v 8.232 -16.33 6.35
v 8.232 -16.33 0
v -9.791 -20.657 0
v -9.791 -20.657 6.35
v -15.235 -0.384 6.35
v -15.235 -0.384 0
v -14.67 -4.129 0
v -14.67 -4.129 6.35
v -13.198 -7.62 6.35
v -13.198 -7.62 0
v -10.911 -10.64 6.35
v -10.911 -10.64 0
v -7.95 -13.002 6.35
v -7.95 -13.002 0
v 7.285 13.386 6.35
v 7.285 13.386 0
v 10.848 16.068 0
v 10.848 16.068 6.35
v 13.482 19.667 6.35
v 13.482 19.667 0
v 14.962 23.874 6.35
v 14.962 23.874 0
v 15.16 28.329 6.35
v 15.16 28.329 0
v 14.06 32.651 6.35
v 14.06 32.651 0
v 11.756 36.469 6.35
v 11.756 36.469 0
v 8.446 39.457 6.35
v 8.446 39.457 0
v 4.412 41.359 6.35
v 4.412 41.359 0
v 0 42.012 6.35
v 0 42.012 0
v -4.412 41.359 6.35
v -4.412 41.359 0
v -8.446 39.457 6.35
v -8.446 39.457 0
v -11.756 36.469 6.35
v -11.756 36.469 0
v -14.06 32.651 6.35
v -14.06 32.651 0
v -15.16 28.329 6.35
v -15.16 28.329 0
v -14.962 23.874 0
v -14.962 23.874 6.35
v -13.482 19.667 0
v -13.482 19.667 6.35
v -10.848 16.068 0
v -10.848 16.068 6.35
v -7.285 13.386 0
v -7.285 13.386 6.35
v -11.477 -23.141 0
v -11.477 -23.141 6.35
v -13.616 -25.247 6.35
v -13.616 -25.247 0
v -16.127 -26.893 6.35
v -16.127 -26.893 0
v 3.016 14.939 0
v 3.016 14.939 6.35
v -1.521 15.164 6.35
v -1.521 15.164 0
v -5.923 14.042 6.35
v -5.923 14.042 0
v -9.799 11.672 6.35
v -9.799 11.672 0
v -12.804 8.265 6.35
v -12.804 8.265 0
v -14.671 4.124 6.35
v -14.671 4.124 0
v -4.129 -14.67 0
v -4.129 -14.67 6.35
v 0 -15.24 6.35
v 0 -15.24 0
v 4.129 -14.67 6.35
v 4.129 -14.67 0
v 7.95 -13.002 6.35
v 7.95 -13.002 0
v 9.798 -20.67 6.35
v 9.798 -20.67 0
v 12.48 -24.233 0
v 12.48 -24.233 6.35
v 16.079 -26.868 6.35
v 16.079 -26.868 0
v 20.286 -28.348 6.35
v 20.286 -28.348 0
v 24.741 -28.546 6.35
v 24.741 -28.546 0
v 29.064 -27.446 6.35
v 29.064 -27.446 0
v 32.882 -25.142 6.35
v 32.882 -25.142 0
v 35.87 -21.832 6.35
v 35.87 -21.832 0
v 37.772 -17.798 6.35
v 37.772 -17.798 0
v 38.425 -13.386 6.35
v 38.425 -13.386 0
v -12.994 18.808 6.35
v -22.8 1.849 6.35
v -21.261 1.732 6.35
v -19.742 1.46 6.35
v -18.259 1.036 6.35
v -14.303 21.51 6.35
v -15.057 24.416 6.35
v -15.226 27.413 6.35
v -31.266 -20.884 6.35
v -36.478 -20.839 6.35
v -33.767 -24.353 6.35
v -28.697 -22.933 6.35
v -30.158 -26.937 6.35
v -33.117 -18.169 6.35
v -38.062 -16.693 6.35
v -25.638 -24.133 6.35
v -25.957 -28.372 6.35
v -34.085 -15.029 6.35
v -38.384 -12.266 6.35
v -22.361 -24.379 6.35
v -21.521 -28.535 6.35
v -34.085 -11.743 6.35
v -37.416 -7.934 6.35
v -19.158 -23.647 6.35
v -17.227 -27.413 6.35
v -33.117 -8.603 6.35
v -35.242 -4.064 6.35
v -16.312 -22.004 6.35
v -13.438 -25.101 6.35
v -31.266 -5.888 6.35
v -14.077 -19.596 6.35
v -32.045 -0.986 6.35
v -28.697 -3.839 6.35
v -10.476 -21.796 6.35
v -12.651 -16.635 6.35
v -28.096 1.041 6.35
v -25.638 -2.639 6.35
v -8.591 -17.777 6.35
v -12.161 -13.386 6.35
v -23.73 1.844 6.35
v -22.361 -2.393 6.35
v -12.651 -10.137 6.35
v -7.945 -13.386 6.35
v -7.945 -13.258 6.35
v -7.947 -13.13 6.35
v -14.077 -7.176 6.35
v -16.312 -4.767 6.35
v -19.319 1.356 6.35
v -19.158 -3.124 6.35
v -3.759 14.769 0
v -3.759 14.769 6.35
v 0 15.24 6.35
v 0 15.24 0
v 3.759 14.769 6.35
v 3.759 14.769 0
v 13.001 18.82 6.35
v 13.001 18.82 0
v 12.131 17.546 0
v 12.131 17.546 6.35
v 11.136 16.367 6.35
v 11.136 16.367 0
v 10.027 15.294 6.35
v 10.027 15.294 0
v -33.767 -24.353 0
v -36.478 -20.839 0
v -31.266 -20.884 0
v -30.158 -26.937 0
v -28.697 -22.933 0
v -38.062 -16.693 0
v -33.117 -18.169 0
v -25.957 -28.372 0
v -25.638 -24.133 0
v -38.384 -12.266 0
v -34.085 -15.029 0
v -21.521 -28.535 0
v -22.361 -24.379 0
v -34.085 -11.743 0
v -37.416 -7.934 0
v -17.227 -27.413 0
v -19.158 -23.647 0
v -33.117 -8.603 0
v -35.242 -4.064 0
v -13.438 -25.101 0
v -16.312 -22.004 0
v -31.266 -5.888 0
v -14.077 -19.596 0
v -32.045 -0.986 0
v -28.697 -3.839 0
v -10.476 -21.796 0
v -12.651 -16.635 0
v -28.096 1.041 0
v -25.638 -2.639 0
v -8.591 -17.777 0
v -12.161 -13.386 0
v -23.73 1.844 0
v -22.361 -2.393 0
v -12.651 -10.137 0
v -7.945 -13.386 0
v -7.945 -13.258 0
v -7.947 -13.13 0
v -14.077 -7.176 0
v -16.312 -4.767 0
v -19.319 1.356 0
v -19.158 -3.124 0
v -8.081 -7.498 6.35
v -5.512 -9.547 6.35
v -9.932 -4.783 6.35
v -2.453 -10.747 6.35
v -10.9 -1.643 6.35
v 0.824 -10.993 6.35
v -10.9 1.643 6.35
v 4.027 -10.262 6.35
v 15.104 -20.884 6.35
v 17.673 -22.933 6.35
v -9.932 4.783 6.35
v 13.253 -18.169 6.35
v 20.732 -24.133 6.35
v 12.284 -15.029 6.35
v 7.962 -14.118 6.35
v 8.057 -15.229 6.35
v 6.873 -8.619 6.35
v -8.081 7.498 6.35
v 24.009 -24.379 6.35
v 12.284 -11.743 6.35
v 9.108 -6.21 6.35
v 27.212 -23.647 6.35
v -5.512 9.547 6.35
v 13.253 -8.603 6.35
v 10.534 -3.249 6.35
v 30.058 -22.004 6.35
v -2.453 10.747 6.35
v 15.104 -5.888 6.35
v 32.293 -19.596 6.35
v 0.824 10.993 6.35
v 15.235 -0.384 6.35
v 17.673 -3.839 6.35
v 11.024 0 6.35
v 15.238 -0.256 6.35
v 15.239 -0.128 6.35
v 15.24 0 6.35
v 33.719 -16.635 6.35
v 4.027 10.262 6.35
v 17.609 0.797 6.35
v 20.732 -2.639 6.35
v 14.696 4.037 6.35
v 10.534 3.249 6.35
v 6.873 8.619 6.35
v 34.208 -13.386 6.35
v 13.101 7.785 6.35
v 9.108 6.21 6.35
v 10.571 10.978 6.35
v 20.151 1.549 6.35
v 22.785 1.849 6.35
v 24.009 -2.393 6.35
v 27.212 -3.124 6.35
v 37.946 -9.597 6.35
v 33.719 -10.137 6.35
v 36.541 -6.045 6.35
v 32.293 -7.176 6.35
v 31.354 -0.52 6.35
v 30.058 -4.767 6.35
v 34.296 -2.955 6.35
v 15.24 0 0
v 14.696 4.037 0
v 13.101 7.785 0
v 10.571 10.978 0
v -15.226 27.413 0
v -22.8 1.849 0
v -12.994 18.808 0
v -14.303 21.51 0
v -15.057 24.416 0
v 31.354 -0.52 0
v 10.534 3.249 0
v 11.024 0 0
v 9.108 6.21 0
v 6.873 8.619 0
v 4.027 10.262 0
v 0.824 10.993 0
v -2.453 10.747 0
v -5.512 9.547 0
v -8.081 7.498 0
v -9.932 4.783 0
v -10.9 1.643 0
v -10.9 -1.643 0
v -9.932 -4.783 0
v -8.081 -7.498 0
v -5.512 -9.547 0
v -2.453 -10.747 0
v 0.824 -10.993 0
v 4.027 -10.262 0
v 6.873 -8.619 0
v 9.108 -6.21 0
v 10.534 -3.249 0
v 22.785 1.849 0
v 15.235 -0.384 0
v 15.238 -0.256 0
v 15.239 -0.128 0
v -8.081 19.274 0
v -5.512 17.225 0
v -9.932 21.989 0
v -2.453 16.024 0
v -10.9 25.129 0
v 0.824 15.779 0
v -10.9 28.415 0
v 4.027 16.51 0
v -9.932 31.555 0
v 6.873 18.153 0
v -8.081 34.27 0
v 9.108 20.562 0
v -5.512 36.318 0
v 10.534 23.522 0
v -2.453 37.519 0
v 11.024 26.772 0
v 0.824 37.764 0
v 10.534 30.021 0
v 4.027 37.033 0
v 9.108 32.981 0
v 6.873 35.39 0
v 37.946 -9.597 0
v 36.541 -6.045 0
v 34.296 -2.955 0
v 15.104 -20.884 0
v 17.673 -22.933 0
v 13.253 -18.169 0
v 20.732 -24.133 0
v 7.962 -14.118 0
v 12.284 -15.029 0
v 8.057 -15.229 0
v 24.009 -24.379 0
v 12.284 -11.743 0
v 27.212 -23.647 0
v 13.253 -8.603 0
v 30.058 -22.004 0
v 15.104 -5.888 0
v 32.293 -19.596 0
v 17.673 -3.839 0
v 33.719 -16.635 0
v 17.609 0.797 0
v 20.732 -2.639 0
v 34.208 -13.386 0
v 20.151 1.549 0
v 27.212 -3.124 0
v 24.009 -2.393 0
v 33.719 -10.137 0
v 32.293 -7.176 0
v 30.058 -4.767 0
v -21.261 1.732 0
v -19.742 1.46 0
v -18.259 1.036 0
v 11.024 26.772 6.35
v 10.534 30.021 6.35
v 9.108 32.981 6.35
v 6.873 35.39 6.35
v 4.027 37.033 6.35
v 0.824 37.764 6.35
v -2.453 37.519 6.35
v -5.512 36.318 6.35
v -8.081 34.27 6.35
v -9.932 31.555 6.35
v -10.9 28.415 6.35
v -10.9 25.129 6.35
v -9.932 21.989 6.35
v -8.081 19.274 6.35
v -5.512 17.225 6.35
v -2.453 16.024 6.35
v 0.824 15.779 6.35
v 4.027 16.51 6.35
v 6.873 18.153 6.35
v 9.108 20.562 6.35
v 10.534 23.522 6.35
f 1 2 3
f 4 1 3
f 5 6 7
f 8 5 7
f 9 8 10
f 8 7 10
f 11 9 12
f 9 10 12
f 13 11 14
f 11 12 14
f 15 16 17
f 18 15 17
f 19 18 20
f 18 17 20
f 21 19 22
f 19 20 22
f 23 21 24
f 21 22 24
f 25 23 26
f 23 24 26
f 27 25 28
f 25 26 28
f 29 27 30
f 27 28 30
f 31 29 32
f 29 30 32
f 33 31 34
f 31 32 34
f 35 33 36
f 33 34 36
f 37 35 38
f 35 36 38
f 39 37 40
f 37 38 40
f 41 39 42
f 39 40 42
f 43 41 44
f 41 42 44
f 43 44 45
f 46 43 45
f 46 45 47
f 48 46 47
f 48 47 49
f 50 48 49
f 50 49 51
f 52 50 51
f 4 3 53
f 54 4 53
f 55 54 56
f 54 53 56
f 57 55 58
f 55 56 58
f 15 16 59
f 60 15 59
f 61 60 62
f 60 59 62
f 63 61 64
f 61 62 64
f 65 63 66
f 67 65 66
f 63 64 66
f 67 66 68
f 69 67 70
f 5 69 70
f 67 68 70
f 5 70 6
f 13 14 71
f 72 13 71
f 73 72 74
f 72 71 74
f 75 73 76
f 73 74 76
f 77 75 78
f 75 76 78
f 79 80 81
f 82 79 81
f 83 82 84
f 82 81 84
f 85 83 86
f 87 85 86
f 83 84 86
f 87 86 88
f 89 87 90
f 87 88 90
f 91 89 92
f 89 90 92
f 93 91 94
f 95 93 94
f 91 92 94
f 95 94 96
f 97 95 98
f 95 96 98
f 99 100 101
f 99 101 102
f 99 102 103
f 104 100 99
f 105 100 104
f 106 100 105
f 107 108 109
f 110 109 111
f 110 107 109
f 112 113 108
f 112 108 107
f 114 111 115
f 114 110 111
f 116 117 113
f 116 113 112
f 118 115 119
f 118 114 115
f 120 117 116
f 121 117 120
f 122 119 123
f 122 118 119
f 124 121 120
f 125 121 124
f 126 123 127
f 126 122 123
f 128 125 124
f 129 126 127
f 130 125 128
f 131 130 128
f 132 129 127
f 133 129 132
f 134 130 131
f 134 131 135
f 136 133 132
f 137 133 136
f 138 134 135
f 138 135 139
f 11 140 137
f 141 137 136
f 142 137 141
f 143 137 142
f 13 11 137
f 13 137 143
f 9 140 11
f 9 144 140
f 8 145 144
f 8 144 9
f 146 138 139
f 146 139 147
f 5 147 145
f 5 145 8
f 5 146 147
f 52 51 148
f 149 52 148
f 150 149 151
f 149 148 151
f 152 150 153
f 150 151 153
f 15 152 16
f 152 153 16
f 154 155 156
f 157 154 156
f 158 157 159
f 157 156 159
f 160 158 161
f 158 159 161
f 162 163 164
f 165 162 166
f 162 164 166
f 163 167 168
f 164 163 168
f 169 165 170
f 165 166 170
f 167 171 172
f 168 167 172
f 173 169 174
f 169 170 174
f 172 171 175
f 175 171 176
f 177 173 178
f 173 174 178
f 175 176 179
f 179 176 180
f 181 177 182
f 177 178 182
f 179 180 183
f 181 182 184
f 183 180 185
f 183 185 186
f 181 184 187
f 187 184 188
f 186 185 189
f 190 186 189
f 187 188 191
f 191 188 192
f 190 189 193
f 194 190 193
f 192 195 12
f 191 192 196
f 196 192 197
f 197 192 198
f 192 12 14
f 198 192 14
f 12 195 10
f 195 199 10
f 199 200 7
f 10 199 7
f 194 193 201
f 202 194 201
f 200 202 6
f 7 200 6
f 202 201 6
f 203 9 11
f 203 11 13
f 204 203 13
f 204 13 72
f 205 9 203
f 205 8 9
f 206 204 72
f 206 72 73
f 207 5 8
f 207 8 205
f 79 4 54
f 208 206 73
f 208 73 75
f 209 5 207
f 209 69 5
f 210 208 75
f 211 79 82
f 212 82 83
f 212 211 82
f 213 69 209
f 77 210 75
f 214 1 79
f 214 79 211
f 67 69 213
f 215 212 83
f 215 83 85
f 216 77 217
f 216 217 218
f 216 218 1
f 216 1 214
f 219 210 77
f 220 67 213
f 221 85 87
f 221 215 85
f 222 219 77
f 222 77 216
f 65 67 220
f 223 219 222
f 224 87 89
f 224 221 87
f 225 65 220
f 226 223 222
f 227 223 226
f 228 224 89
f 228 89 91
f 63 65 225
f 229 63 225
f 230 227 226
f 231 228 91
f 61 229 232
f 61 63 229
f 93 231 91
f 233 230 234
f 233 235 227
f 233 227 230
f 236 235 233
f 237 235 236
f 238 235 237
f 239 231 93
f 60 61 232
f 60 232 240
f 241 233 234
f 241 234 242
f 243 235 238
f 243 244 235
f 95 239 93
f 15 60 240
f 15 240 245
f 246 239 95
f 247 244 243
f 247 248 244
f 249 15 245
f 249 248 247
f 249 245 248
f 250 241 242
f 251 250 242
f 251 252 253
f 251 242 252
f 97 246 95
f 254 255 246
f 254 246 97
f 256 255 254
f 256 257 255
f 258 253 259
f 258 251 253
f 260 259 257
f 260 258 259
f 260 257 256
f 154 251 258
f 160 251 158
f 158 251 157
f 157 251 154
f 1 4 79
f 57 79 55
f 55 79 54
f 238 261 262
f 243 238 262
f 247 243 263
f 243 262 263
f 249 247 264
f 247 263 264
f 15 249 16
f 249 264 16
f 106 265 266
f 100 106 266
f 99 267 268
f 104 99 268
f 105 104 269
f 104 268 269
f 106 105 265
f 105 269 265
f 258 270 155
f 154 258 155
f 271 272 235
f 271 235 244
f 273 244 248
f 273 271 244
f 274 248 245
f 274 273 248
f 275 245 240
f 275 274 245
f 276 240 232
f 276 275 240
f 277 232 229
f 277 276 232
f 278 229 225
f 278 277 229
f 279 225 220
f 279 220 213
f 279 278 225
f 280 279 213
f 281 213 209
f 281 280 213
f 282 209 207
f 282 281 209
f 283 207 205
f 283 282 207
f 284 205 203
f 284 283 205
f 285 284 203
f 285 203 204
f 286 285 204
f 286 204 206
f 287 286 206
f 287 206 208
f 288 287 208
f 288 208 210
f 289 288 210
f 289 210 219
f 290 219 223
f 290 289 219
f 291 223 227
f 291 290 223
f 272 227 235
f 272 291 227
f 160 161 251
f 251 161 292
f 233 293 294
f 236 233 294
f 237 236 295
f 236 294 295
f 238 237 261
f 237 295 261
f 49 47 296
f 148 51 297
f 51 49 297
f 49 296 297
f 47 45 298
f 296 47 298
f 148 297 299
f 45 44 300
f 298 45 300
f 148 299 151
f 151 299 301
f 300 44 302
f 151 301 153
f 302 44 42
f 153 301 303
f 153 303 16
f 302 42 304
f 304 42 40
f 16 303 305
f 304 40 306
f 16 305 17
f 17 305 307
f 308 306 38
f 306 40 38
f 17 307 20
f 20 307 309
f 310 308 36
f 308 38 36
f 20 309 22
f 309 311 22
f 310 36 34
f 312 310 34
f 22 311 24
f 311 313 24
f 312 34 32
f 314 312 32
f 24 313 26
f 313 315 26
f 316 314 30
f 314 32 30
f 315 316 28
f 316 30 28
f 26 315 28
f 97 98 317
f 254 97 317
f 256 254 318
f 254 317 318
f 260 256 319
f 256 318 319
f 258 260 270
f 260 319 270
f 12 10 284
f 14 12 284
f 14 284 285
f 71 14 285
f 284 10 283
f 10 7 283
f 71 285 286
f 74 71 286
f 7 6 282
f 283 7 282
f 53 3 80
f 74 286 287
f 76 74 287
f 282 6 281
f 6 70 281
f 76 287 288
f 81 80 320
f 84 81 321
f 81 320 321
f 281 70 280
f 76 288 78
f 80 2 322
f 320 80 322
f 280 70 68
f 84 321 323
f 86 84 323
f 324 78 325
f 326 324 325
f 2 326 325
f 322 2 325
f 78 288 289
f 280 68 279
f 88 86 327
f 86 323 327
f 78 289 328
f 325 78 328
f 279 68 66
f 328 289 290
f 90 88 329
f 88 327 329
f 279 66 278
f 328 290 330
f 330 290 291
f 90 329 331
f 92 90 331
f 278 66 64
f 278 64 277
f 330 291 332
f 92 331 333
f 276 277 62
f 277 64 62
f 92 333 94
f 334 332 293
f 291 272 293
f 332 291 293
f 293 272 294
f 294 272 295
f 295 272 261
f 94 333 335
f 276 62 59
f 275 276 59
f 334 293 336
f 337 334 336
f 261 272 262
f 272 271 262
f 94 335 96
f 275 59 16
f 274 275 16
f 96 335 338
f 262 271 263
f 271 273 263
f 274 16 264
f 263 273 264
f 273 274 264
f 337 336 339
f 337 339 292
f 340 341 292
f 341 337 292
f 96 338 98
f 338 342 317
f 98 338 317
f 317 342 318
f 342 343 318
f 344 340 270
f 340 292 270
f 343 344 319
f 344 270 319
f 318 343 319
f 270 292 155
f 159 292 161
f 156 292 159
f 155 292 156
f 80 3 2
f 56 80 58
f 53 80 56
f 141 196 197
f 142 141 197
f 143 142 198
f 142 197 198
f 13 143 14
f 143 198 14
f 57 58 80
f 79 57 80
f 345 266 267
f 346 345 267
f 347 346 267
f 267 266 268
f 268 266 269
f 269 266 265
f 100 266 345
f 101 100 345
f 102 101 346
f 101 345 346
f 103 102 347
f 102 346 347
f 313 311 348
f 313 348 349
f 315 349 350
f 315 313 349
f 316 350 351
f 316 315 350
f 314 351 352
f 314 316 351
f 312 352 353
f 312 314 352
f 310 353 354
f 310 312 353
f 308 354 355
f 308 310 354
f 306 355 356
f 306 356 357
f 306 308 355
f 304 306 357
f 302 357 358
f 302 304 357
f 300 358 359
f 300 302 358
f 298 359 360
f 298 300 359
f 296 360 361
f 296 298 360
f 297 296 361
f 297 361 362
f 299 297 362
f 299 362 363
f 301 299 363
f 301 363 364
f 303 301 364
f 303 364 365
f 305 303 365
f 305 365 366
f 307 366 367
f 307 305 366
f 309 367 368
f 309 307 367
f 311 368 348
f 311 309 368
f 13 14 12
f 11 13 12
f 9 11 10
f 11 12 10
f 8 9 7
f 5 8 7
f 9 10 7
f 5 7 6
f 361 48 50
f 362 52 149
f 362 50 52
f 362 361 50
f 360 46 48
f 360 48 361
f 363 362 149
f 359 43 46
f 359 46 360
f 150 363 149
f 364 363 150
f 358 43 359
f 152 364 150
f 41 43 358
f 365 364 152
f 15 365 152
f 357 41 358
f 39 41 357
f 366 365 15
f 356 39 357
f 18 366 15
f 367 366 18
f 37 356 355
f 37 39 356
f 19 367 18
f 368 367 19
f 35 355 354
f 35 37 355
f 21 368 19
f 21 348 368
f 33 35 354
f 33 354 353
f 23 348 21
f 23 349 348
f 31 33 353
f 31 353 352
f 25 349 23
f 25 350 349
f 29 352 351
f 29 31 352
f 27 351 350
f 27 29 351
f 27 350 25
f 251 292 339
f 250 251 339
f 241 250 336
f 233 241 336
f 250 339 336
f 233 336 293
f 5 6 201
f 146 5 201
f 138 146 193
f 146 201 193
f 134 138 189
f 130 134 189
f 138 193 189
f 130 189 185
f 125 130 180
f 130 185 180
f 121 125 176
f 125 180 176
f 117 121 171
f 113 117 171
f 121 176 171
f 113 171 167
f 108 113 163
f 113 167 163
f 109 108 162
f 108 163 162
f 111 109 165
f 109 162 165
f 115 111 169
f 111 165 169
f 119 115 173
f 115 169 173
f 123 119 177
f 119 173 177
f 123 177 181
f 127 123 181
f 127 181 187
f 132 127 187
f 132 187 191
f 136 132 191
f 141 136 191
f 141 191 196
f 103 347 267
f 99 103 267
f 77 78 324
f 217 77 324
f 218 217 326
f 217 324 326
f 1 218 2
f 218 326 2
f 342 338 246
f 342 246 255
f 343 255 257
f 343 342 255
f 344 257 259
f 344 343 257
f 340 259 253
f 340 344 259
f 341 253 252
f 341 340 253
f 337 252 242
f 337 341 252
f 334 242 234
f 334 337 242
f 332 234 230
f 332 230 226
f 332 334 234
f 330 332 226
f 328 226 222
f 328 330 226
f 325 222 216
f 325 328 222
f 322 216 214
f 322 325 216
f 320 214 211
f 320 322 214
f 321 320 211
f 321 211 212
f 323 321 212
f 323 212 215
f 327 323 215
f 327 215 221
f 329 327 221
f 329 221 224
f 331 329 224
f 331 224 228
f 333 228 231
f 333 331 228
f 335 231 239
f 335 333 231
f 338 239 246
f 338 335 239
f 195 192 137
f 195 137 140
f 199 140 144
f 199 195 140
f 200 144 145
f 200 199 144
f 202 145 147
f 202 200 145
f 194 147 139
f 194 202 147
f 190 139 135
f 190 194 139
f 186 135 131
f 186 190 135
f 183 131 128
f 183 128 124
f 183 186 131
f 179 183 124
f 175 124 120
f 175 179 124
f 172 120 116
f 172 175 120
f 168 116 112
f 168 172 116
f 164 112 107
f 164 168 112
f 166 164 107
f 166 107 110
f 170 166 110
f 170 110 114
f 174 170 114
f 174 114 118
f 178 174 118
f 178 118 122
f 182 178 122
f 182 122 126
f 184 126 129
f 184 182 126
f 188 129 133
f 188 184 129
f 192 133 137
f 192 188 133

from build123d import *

# Parameters (mm, degrees)
F1_R     = 11.0236
F2_DEPTH = 6.35
F0_R     = 11.0236


with BuildPart() as f2:
    # F1 (on Top) → F2 (new body)
    with BuildSketch(Plane.XY):
        with BuildLine():
            Line((31.3536591279, -0.5200026799), (13.0013645891, 18.8203662076))
            ThreePointArc((13.0013645891, 18.8203662076), (11.648148434, 16.9441772423), (10.0265557348, 15.2944148008))
            Line((10.0265557348, 15.2944148008), (22.7851039854, 1.8489554815))
            ThreePointArc((22.7851039854, 1.8489554815), (27.2459568337, 1.3031516728), (31.3536591279, -0.5200026799))
        make_face()
        with BuildLine():
            ThreePointArc((-9.7913095753, -20.65695662), (-12.4944159632, -24.2472666048), (-16.1271650948, -26.8930639664))
            Line((-16.1271650948, -26.8930639664), (9.7982329498, -20.6696951218))
            ThreePointArc((9.7982329498, -20.6696951218), (8.850013721, -18.5596810721), (8.2320738861, -16.3304593791))
            Line((8.2320738861, -16.3304593791), (-9.7913095753, -20.65695662))
        make_face()
        with BuildLine():
            ThreePointArc((-7.949711788, -13.0022952777), (-9.9866585463, -5.7658), (-15.235173912, -0.3835047223))
            ThreePointArc((-15.235173912, -0.3835047223), (-13.1982271537, -7.62), (-7.949711788, -13.0022952777))
        make_face()
        with BuildLine():
            ThreePointArc((7.285462124, 13.3858), (0, 15.24), (-7.285462124, 13.3858))
            ThreePointArc((-7.285462124, 13.3858), (0, 11.5316), (7.285462124, 13.3858))
        make_face()
        with BuildLine():
            ThreePointArc((38.4248857, -13.3858), (36.5405906054, -6.0453131988), (31.3536591279, -0.5200026799))
            ThreePointArc((31.3536591279, -0.5200026799), (27.2459568337, 1.3031516728), (22.7851039854, 1.8489554815))
            ThreePointArc((22.7851039854, 1.8489554815), (18.863487769, 1.2286832246), (15.235173912, -0.3835047223))
            ThreePointArc((15.235173912, -0.3835047223), (13.1982271537, -7.62), (7.949711788, -13.0022952777))
            ThreePointArc((7.949711788, -13.0022952777), (7.9994390612, -14.6741362848), (8.2320738861, -16.3304593791))
            ThreePointArc((8.2320738861, -16.3304593791), (8.850013721, -18.5596810721), (9.7982329498, -20.6696951218))
            ThreePointArc((9.7982329498, -20.6696951218), (26.9428779889, -28.1551972103), (38.4248857, -13.3858))
        make_face()
        with Locations((23.1848857, -13.3858)):
            Circle(F1_R, mode=Mode.SUBTRACT)
        with BuildLine():
            ThreePointArc((7.949711788, -13.0022952777), (13.1982271537, -7.62), (15.235173912, -0.3835047223))
            ThreePointArc((15.235173912, -0.3835047223), (9.9866585463, -5.7658), (7.949711788, -13.0022952777))
        make_face()
        with BuildLine():
            ThreePointArc((7.285462124, 13.3858), (0, 11.5316), (-7.285462124, 13.3858))
            ThreePointArc((-7.285462124, 13.3858), (-13.1982271537, 7.62), (-15.235173912, -0.3835047223))
            ThreePointArc((-15.235173912, -0.3835047223), (-9.9866585463, -5.7658), (-7.949711788, -13.0022952777))
            ThreePointArc((-7.949711788, -13.0022952777), (0, -15.24), (7.949711788, -13.0022952777))
            ThreePointArc((7.949711788, -13.0022952777), (9.9866585463, -5.7658), (15.235173912, -0.3835047223))
            ThreePointArc((15.235173912, -0.3835047223), (15.2387934302, -0.1917675436), (15.24, 0))
            ThreePointArc((15.24, 0), (13.1012984618, 7.7854722795), (7.285462124, 13.3858))
        make_face()
        Circle(F1_R, mode=Mode.SUBTRACT)
    extrude(amount=F2_DEPTH)


with BuildPart() as f2b:
    # F1 (on Top) → F2, piece 2 (new body)
    with BuildSketch(Plane.XY):
        with BuildLine():
            ThreePointArc((-12.9937944102, 18.8080011385), (-14.7515408705, 22.944114932), (-15.2264940332, 27.4130666463))
            Line((-15.2264940332, 27.4130666463), (-22.7995975389, 1.8493289142))
            ThreePointArc((-22.7995975389, 1.8493289142), (-20.4981621551, 1.6155038298), (-18.2586296209, 1.0360445784))
            Line((-18.2586296209, 1.0360445784), (-12.9937944102, 18.8080011385))
        make_face()
    extrude(amount=F2_DEPTH)


with BuildPart() as f2c:
    # F0 (on Top) → F2, piece 3 (new body)
    with BuildSketch(Plane.XY):
        with BuildLine():
            ThreePointArc((-7.949711788, -13.0022952777), (-13.1982271537, -7.62), (-15.235173912, -0.3835047223))
            ThreePointArc((-15.235173912, -0.3835047223), (-36.4779517054, -20.8391211507), (-7.9448857, -13.3858))
            ThreePointArc((-7.9448857, -13.3858), (-7.9460922697, -13.1940324564), (-7.949711788, -13.0022952777))
        make_face()
        with Locations((-23.1848857, -13.3858)):
            Circle(F0_R, mode=Mode.SUBTRACT)
    extrude(amount=F2_DEPTH)


with BuildPart() as f2d:
    # F0 (on Top) → F2, piece 4 (new body)
    with BuildSketch(Plane.XY):
        with BuildLine():
            ThreePointArc((-7.285462124, 13.3858), (0, 15.24), (7.285462124, 13.3858))
            ThreePointArc((7.285462124, 13.3858), (13.1012984618, 18.9861277205), (15.24, 26.7716))
            ThreePointArc((15.24, 26.7716), (-7.7854722795, 39.8728984618), (-7.285462124, 13.3858))
        make_face()
        with Locations((0, 26.7716)):
            Circle(F0_R, mode=Mode.SUBTRACT)
    extrude(amount=F2_DEPTH)


solid = Compound([f2.part, f2b.part, f2c.part, f2d.part])
